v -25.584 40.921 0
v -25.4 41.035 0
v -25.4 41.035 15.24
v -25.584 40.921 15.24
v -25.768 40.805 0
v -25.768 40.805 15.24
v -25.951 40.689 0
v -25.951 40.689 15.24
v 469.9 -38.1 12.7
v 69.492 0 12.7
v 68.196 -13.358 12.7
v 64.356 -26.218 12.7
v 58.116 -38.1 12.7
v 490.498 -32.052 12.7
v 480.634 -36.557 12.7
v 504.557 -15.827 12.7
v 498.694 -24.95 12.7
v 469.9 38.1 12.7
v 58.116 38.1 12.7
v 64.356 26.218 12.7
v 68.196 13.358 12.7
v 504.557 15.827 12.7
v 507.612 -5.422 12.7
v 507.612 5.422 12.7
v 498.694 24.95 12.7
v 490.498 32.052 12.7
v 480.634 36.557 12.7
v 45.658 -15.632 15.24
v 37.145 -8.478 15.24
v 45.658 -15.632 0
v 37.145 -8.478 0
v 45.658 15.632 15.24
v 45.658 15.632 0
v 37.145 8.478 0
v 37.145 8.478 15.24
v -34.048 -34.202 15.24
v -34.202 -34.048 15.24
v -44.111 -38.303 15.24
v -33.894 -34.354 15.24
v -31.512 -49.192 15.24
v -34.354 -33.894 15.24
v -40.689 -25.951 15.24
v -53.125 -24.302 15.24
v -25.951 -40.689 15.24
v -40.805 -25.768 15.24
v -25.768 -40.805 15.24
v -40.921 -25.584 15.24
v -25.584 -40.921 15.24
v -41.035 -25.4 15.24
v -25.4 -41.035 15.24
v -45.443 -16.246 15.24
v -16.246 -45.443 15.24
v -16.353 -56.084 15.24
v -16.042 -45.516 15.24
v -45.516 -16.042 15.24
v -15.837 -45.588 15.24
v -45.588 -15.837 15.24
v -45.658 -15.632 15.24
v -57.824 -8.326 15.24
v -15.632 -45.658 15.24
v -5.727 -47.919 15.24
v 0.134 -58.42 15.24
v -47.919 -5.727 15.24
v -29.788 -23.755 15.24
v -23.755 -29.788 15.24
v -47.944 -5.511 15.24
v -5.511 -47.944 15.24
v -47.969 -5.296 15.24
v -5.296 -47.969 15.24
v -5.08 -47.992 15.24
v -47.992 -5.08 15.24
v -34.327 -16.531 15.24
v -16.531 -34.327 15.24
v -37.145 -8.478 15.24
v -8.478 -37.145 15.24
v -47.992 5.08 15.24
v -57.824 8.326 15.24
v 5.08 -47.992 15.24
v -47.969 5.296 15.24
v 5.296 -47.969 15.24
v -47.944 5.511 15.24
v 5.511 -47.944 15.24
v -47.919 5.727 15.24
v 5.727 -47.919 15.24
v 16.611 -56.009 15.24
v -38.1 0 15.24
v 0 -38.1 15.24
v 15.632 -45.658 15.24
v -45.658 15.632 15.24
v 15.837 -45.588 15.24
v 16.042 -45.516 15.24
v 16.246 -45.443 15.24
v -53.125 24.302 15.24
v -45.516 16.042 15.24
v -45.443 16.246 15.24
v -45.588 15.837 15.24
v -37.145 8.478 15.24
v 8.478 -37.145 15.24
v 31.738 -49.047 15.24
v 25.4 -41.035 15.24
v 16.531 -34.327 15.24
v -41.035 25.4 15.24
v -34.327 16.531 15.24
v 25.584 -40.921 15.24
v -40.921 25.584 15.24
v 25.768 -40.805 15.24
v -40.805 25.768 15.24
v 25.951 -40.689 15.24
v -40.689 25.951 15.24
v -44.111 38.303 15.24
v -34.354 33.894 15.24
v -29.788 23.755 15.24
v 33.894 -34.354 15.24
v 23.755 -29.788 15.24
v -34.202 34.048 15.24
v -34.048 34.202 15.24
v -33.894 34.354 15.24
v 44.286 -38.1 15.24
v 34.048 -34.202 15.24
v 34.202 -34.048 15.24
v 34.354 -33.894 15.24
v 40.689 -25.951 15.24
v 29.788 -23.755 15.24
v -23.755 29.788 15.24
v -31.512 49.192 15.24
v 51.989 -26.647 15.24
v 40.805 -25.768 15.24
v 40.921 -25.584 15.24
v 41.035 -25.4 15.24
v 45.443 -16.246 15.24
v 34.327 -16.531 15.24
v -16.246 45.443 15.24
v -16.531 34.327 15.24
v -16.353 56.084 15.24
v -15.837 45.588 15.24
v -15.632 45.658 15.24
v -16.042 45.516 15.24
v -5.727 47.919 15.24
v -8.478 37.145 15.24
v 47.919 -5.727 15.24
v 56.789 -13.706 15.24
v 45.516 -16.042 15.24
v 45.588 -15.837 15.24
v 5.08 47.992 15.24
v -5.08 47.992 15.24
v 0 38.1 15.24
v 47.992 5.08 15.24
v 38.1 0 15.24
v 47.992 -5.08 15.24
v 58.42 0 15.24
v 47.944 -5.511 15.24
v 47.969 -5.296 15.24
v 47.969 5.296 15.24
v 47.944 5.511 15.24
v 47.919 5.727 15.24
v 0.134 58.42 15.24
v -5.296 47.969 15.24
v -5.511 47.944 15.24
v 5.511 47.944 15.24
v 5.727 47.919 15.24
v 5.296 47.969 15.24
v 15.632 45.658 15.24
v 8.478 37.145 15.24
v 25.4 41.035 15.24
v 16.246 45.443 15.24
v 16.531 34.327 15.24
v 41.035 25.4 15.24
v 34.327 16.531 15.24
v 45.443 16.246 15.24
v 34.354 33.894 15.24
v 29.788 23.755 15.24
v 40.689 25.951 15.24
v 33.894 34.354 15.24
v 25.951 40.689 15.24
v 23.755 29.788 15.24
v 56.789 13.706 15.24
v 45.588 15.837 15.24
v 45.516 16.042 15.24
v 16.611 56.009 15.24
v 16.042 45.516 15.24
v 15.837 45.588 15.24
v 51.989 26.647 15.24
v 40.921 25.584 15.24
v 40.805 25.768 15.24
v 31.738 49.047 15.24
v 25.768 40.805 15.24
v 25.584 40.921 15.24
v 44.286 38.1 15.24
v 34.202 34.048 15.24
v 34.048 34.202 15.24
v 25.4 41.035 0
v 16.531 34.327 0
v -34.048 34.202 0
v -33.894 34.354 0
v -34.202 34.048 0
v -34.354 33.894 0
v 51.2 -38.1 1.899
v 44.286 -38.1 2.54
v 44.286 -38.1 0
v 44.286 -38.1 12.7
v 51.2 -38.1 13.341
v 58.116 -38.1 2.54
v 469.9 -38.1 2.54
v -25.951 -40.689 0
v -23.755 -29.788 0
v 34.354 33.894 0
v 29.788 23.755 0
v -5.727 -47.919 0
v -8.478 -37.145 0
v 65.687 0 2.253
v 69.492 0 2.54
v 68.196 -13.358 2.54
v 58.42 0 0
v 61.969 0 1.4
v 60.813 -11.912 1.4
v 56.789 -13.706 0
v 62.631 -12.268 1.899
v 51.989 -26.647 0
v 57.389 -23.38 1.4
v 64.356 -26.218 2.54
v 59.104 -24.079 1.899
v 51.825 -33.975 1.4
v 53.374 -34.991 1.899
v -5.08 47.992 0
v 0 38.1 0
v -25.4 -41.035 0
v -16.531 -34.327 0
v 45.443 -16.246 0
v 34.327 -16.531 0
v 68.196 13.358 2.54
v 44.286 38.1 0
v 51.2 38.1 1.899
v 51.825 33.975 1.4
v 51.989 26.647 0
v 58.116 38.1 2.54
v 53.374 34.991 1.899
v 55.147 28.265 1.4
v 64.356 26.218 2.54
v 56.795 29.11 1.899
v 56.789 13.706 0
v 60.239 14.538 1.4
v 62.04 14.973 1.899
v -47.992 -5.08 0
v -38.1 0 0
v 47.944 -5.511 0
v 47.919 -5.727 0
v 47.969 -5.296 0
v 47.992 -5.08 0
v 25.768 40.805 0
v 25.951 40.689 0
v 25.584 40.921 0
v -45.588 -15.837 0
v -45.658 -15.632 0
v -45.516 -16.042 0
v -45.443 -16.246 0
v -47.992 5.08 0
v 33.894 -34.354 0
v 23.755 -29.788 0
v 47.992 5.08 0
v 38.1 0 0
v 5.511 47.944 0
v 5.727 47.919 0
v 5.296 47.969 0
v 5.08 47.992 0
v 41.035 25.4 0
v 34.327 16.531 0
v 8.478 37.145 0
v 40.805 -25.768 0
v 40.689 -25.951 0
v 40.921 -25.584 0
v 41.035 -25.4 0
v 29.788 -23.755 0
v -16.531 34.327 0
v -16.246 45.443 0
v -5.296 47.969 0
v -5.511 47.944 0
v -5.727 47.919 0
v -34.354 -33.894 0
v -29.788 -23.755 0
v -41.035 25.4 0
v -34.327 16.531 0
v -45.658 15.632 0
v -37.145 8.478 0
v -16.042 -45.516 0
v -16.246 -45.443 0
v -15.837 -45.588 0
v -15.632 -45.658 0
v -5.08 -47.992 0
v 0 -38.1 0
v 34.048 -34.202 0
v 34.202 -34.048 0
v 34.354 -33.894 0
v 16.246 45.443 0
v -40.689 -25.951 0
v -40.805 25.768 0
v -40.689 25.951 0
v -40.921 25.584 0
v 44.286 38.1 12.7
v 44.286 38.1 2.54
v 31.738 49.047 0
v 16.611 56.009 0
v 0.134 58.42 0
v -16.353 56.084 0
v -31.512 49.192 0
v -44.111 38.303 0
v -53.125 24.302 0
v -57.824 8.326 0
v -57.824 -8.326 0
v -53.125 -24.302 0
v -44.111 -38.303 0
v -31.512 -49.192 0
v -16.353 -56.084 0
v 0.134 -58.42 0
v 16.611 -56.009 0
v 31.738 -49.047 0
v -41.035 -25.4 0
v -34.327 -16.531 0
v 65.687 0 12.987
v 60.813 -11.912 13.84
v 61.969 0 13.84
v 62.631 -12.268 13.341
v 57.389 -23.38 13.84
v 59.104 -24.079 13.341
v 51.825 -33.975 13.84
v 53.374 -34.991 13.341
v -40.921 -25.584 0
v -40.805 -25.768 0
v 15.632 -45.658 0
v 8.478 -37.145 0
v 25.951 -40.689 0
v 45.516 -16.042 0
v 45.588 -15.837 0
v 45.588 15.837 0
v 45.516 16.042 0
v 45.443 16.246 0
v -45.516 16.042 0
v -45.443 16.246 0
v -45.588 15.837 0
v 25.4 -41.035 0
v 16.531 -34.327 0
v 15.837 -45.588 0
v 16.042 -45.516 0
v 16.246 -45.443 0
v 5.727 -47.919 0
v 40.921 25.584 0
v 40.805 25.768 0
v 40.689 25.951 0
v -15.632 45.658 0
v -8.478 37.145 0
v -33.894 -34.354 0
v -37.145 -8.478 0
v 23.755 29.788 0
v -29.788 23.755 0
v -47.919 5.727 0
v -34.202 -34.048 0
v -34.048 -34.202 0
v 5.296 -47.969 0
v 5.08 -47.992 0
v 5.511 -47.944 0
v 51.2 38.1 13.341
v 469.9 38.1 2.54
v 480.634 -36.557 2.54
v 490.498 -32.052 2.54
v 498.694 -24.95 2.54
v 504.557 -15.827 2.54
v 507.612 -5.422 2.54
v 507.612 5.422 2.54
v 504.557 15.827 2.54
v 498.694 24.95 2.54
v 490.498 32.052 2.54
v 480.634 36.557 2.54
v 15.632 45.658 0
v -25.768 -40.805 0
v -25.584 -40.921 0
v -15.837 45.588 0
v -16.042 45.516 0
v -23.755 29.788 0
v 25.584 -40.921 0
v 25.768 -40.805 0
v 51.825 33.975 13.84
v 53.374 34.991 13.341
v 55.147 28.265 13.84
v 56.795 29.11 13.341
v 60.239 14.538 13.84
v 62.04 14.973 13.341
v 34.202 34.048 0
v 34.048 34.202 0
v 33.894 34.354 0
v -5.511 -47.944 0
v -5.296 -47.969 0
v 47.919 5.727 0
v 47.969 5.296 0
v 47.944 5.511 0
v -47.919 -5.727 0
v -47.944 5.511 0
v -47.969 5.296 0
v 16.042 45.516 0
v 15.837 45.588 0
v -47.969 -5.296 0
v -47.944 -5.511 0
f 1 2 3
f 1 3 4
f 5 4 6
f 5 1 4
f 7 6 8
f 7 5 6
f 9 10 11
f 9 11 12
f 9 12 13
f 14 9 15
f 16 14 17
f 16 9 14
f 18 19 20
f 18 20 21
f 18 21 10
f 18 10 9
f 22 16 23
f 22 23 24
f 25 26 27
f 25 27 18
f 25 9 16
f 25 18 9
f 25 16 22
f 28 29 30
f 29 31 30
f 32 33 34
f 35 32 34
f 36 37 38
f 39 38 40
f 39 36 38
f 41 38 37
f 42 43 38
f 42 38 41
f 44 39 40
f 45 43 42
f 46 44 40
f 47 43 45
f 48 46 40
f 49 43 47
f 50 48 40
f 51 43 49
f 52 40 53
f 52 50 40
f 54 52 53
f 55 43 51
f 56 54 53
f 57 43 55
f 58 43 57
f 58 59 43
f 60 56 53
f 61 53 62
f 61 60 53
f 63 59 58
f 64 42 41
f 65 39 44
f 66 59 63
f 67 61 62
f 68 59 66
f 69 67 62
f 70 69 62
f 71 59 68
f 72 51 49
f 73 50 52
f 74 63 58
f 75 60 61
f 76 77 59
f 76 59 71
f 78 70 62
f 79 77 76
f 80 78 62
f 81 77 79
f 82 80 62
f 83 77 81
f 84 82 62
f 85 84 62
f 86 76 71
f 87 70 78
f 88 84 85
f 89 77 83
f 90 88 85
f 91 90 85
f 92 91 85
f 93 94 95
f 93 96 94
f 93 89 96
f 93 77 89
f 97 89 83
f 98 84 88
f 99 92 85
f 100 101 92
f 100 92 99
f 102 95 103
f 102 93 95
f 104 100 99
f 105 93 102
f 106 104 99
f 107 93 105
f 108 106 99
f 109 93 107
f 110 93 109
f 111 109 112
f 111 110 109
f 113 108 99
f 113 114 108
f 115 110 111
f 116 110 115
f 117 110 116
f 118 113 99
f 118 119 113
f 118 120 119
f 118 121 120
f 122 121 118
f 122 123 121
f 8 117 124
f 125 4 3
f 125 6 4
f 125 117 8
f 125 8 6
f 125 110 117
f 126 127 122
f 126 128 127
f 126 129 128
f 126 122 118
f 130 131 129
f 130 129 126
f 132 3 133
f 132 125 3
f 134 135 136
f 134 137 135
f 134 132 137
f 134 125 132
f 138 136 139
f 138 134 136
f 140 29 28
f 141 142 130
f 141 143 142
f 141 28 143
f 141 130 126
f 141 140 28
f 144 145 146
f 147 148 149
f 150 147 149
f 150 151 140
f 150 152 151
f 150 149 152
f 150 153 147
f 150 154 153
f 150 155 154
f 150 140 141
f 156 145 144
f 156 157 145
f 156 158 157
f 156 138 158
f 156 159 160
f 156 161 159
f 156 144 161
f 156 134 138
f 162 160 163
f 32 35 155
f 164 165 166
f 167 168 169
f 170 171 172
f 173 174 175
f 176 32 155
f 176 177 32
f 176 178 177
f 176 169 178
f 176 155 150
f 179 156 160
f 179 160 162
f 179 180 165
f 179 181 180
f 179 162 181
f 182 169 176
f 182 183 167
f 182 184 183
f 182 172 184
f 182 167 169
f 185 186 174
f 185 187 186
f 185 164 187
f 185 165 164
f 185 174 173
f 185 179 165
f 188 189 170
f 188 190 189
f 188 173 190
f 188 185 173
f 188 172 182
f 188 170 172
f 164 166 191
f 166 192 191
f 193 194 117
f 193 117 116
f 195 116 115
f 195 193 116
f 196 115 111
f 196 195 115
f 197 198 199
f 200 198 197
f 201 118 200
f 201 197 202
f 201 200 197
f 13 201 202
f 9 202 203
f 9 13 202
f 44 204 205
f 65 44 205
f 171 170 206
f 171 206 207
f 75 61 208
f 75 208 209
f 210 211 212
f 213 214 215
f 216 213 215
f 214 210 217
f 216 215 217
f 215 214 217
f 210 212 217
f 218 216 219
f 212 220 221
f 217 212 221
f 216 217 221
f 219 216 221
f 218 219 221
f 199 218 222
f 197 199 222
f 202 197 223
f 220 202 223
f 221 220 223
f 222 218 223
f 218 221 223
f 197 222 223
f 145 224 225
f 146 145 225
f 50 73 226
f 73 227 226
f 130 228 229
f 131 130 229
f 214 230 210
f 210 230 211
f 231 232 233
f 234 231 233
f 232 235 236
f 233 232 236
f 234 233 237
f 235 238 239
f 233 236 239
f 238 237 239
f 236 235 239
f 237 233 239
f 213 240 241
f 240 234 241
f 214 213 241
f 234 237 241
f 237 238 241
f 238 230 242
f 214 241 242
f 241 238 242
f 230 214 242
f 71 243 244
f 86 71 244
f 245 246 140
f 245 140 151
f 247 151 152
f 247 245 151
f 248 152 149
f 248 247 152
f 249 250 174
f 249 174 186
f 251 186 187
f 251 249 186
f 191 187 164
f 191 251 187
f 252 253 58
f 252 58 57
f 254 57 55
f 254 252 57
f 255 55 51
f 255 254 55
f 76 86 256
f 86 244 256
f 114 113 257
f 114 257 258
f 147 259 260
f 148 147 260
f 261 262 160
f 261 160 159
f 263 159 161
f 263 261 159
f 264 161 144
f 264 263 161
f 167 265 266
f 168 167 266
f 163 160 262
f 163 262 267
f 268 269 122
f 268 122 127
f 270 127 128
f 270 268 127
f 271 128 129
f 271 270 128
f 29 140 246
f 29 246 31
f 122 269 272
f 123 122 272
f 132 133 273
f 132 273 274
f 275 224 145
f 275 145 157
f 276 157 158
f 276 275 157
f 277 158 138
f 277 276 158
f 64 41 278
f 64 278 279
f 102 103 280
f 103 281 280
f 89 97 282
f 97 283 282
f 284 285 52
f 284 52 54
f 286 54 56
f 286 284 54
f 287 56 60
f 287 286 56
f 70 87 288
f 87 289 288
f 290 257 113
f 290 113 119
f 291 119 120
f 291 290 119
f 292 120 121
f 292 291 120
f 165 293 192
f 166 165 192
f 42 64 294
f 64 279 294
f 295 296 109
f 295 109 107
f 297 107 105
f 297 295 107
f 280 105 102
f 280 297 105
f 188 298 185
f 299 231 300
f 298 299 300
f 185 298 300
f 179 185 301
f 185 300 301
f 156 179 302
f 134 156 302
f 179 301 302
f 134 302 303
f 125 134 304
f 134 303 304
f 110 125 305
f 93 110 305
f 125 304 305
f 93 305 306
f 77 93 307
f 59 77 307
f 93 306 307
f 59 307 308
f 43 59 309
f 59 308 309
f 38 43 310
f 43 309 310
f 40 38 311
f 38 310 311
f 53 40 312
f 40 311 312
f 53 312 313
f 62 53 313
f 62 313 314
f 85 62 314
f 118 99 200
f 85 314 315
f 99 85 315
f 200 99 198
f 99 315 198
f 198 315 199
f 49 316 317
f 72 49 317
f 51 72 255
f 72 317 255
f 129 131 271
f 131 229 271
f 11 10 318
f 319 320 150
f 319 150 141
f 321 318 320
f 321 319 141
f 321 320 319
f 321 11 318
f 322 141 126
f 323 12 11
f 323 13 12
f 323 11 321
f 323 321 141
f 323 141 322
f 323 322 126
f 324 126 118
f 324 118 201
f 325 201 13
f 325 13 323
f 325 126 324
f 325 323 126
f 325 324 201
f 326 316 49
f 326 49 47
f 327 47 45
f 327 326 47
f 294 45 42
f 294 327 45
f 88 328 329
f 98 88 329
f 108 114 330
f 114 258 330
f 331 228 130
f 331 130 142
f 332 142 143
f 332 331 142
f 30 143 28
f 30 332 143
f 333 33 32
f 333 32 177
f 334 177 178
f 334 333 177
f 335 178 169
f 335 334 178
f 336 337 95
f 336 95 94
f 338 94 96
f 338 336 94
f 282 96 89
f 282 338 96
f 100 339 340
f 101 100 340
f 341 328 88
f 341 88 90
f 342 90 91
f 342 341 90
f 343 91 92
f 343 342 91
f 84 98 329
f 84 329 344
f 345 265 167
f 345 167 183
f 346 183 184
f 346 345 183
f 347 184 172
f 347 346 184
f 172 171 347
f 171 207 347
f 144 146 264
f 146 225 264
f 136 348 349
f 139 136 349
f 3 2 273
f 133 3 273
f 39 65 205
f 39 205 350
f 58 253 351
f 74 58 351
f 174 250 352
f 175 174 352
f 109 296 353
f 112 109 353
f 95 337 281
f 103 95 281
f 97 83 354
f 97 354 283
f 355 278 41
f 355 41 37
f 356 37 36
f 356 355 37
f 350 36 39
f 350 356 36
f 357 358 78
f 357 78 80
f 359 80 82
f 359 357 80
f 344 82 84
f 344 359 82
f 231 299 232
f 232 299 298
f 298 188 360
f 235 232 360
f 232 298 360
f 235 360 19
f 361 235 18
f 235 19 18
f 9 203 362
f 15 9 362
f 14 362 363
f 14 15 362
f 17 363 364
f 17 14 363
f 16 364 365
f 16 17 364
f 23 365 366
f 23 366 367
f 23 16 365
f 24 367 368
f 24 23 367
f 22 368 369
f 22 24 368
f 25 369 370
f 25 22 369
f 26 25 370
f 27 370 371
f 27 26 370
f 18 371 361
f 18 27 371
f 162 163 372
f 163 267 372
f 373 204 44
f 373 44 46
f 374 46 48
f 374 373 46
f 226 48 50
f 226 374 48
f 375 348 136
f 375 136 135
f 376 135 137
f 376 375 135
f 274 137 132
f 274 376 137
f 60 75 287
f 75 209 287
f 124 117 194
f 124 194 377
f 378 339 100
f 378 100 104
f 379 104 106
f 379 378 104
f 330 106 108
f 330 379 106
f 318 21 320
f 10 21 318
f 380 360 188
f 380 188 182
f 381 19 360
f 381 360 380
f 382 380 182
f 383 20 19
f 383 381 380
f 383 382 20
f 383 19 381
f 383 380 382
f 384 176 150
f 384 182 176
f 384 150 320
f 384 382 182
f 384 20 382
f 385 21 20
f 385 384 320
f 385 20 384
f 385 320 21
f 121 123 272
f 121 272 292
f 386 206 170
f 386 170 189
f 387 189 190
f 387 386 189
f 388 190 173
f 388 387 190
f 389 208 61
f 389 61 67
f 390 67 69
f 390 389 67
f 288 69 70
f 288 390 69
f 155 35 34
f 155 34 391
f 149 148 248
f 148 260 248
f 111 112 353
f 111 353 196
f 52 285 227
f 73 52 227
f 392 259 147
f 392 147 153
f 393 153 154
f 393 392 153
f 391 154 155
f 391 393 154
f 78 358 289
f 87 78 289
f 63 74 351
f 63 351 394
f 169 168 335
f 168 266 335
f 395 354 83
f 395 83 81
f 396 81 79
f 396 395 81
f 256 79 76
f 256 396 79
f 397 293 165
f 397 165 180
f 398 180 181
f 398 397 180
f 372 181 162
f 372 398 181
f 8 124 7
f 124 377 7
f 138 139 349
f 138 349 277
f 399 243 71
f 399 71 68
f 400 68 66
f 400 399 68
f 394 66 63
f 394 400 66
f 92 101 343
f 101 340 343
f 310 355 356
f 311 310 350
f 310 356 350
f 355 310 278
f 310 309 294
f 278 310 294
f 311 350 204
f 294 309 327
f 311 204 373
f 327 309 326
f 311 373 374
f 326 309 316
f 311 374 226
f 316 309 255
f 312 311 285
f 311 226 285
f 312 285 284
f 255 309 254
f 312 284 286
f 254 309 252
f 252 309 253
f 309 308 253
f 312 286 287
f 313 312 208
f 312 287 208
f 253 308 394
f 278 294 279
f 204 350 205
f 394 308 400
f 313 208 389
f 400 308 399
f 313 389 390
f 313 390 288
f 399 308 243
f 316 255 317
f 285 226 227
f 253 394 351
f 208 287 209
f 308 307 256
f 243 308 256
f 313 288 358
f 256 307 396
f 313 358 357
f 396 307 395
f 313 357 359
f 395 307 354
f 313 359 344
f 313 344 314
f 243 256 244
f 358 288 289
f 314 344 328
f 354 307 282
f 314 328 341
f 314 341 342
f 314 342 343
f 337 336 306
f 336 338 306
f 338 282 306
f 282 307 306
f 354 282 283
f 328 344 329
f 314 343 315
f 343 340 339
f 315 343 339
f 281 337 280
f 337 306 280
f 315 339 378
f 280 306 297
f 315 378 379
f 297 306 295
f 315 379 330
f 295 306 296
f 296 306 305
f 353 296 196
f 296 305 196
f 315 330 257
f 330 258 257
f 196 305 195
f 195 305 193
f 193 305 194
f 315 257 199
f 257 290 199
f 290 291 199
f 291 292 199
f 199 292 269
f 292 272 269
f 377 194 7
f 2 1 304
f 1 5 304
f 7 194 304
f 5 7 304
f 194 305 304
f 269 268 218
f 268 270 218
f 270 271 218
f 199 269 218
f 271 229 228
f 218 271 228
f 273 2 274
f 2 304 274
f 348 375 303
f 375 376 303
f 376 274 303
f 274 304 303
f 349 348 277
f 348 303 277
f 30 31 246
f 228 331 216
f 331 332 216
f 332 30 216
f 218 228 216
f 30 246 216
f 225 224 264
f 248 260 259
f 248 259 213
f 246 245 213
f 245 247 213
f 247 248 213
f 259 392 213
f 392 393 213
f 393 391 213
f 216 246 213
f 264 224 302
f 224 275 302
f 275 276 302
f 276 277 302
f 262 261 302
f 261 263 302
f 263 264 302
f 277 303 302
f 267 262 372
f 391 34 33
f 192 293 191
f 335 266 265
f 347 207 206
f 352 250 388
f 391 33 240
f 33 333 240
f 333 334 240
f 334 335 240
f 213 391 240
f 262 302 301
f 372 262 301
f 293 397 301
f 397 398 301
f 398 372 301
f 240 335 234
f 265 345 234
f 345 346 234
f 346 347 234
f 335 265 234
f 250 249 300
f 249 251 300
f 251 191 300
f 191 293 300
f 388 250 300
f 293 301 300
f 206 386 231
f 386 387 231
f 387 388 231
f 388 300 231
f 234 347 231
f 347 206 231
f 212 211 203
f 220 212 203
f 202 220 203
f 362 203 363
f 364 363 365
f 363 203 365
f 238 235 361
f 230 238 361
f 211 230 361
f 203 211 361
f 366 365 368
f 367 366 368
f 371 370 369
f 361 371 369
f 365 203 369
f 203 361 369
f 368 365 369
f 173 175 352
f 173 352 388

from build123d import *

# Parameters (mm, degrees)
F0_R         = 58.42
F0_R_2       = 48.26
F1_DEPTH     = 15.24
F4_DEPTH     = 5.08
F6_DEPTH     = 7.62
F7_T4_ANGLE  = 67.8542971522
F7_T9_ANGLE  = 67.8542971522
F7_T14_ANGLE = 67.8542971522
F7_T19_ANGLE = 67.8542971522


# Not quite as in the source:
# - a fillet or chamfer that OpenCascade refuses, or shapes differently, is made with other operations: its cross-section is extruded or revolved along the edge and cut away or added


with BuildPart() as f1:
    # F0 (on Top) → F1 (new body)
    with BuildSketch(Plane.XY):
        Circle(F0_R)
        Circle(F0_R_2, mode=Mode.SUBTRACT)
    extrude(amount=F1_DEPTH)

    # F3 (on offset) → F4 (join, symmetric)
    with BuildSketch(Plane.XY.offset(7.62)):
        with BuildLine():
            Line((469.9, 38.1), (44.2864132664, 38.1))
            ThreePointArc((44.2864132664, 38.1), (58.3891573479, 0), (44.2864132664, -38.1))
            Line((44.2864132664, -38.1), (469.9, -38.1))
            ThreePointArc((469.9, -38.1), (508, 0), (469.9, 38.1))
        make_face()
    extrude(amount=F4_DEPTH, both=True)

    # F5 (on offset) → F6 (join, symmetric)
    with BuildSketch(Plane.XY.offset(7.62)):
        with BuildLine():
            Line((-15.6318332701, 45.6582236691), (-8.4780475837, 37.1447534541))
            Line((-8.4780475837, 37.1447534541), (-5.7265656824, 47.9190363581))
            ThreePointArc((-5.7265656824, 47.9190363581), (-10.7388602727, 47.0500210419), (-15.6318332701, 45.6582236691))
        make_face()
        with BuildLine():
            Line((-5.08, 47.9918868143), (0, 38.1))
            Line((0, 38.1), (5.08, 47.9918868143))
            ThreePointArc((5.08, 47.9918868143), (0, 48.26), (-5.08, 47.9918868143))
        make_face()
        with BuildLine():
            Line((5.7265656824, 47.9190363581), (8.4780475837, 37.1447534541))
            Line((8.4780475837, 37.1447534541), (15.6318332701, 45.6582236691))
            ThreePointArc((15.6318332701, 45.6582236691), (10.7388602727, 47.0500210419), (5.7265656824, 47.9190363581))
        make_face()
        with BuildLine():
            Line((16.2459774494, 45.4433253263), (16.5309704604, 34.3269138671))
            Line((16.5309704604, 34.3269138671), (25.3998211473, 41.0350665369))
            ThreePointArc((25.3998211473, 41.0350665369), (20.9392292498, 43.480757565), (16.2459774494, 45.4433253263))
        make_face()
        with BuildLine():
            Line((25.9507480698, 40.6888962079), (23.7549614508, 29.787779482))
            Line((23.7549614508, 29.787779482), (33.8941559316, 34.354239821))
            ThreePointArc((33.8941559316, 34.354239821), (30.0896178377, 37.7311873439), (25.9507480698, 40.6888962079))
        make_face()
        with BuildLine():
            Line((34.354239821, 33.8941559316), (29.787779482, 23.7549614508))
            Line((29.787779482, 23.7549614508), (40.6888962079, 25.9507480698))
            ThreePointArc((40.6888962079, 25.9507480698), (37.7311873439, 30.0896178377), (34.354239821, 33.8941559316))
        make_face()
        with BuildLine():
            Line((41.0350665369, 25.3998211473), (34.3269138671, 16.5309704604))
            Line((34.3269138671, 16.5309704604), (45.4433253263, 16.2459774494))
            ThreePointArc((45.4433253263, 16.2459774494), (43.480757565, 20.9392292498), (41.0350665369, 25.3998211473))
        make_face()
        with BuildLine():
            Line((45.6582236691, 15.6318332701), (37.1447534541, 8.4780475837))
            Line((37.1447534541, 8.4780475837), (47.9190363581, 5.7265656824))
            ThreePointArc((47.9190363581, 5.7265656824), (47.0500210419, 10.7388602727), (45.6582236691, 15.6318332701))
        make_face()
        with BuildLine():
            Line((47.9918868143, 5.08), (38.1, 0))
            Line((38.1, 0), (47.9918868143, -5.08))
            ThreePointArc((47.9918868143, -5.08), (48.26, 0), (47.9918868143, 5.08))
        make_face()
        with BuildLine():
            Line((47.9190363581, -5.7265656824), (37.1447534541, -8.4780475837))
            Line((37.1447534541, -8.4780475837), (45.6582236691, -15.6318332701))
            ThreePointArc((45.6582236691, -15.6318332701), (47.0500210419, -10.7388602727), (47.9190363581, -5.7265656824))
        make_face()
        with BuildLine():
            Line((45.4433253263, -16.2459774494), (34.3269138671, -16.5309704604))
            Line((34.3269138671, -16.5309704604), (41.0350665369, -25.3998211473))
            ThreePointArc((41.0350665369, -25.3998211473), (43.480757565, -20.9392292498), (45.4433253263, -16.2459774494))
        make_face()
        with BuildLine():
            Line((40.6888962079, -25.9507480698), (29.787779482, -23.7549614508))
            Line((29.787779482, -23.7549614508), (34.354239821, -33.8941559316))
            ThreePointArc((34.354239821, -33.8941559316), (37.7311873439, -30.0896178377), (40.6888962079, -25.9507480698))
        make_face()
        with BuildLine():
            Line((25.3998211473, -41.0350665369), (16.5309704604, -34.3269138671))
            Line((16.5309704604, -34.3269138671), (16.2459774494, -45.4433253263))
            ThreePointArc((16.2459774494, -45.4433253263), (20.9392292498, -43.480757565), (25.3998211473, -41.0350665369))
        make_face()
        with BuildLine():
            Line((15.6318332701, -45.6582236691), (8.4780475837, -37.1447534541))
            Line((8.4780475837, -37.1447534541), (5.7265656824, -47.9190363581))
            ThreePointArc((5.7265656824, -47.9190363581), (10.7388602727, -47.0500210419), (15.6318332701, -45.6582236691))
        make_face()
        with BuildLine():
            Line((5.08, -47.9918868143), (0, -38.1))
            Line((0, -38.1), (-5.08, -47.9918868143))
            ThreePointArc((-5.08, -47.9918868143), (0, -48.26), (5.08, -47.9918868143))
        make_face()
        with BuildLine():
            Line((33.8941559316, -34.354239821), (23.7549614508, -29.787779482))
            Line((23.7549614508, -29.787779482), (25.9507480698, -40.6888962079))
            ThreePointArc((25.9507480698, -40.6888962079), (30.0896178377, -37.7311873439), (33.8941559316, -34.354239821))
        make_face()
        with BuildLine():
            Line((-5.7265656824, -47.9190363581), (-8.4780475837, -37.1447534541))
            Line((-8.4780475837, -37.1447534541), (-15.6318332701, -45.6582236691))
            ThreePointArc((-15.6318332701, -45.6582236691), (-10.7388602727, -47.0500210419), (-5.7265656824, -47.9190363581))
        make_face()
        with BuildLine():
            Line((-16.2459774494, -45.4433253263), (-16.5309704604, -34.3269138671))
            Line((-16.5309704604, -34.3269138671), (-25.3998211473, -41.0350665369))
            ThreePointArc((-25.3998211473, -41.0350665369), (-20.9392292498, -43.480757565), (-16.2459774494, -45.4433253263))
        make_face()
        with BuildLine():
            Line((-25.9507480698, -40.6888962079), (-23.7549614508, -29.787779482))
            Line((-23.7549614508, -29.787779482), (-33.8941559316, -34.354239821))
            ThreePointArc((-33.8941559316, -34.354239821), (-30.0896178377, -37.7311873439), (-25.9507480698, -40.6888962079))
        make_face()
        with BuildLine():
            Line((-34.354239821, -33.8941559316), (-29.787779482, -23.7549614508))
            Line((-29.787779482, -23.7549614508), (-40.6888962079, -25.9507480698))
            ThreePointArc((-40.6888962079, -25.9507480698), (-37.7311873439, -30.0896178377), (-34.354239821, -33.8941559316))
        make_face()
        with BuildLine():
            Line((-41.0350665369, -25.3998211473), (-34.3269138671, -16.5309704604))
            Line((-34.3269138671, -16.5309704604), (-45.4433253263, -16.2459774494))
            ThreePointArc((-45.4433253263, -16.2459774494), (-43.480757565, -20.9392292498), (-41.0350665369, -25.3998211473))
        make_face()
        with BuildLine():
            Line((-45.6582236691, -15.6318332701), (-37.1447534541, -8.4780475837))
            Line((-37.1447534541, -8.4780475837), (-47.9190363581, -5.7265656824))
            ThreePointArc((-47.9190363581, -5.7265656824), (-47.0500210419, -10.7388602727), (-45.6582236691, -15.6318332701))
        make_face()
        with BuildLine():
            Line((-47.9918868143, -5.08), (-38.1, 0))
            Line((-38.1, 0), (-47.9918868143, 5.08))
            ThreePointArc((-47.9918868143, 5.08), (-48.26, 0), (-47.9918868143, -5.08))
        make_face()
        with BuildLine():
            Line((-47.9190363581, 5.7265656824), (-37.1447534541, 8.4780475837))
            Line((-37.1447534541, 8.4780475837), (-45.6582236691, 15.6318332701))
            ThreePointArc((-45.6582236691, 15.6318332701), (-47.0500210419, 10.7388602727), (-47.9190363581, 5.7265656824))
        make_face()
        with BuildLine():
            Line((-45.4433253263, 16.2459774494), (-34.3269138671, 16.5309704604))
            Line((-34.3269138671, 16.5309704604), (-41.0350665369, 25.3998211473))
            ThreePointArc((-41.0350665369, 25.3998211473), (-43.480757565, 20.9392292498), (-45.4433253263, 16.2459774494))
        make_face()
        with BuildLine():
            Line((-40.6888962079, 25.9507480698), (-29.787779482, 23.7549614508))
            Line((-29.787779482, 23.7549614508), (-34.354239821, 33.8941559316))
            ThreePointArc((-34.354239821, 33.8941559316), (-37.7311873439, 30.0896178377), (-40.6888962079, 25.9507480698))
        make_face()
        with BuildLine():
            Line((-33.8941559316, 34.354239821), (-23.7549614508, 29.787779482))
            Line((-23.7549614508, 29.787779482), (-25.9507480698, 40.6888962079))
            ThreePointArc((-25.9507480698, 40.6888962079), (-30.0896178377, 37.7311873439), (-33.8941559316, 34.354239821))
        make_face()
        with BuildLine():
            Line((-25.3998211473, 41.0350665369), (-16.5309704604, 34.3269138671))
            Line((-16.5309704604, 34.3269138671), (-16.2459774494, 45.4433253263))
            ThreePointArc((-16.2459774494, 45.4433253263), (-20.9392292498, 43.480757565), (-25.3998211473, 41.0350665369))
        make_face()
    extrude(amount=F6_DEPTH, both=True)

    # F7: fillet of radius 25.4 on 4 edges, made by hand


with BuildPart() as f7_tool2:
    # F7_s3 → F7_t4 (revolve)
    with BuildSketch(Plane.XZ):
        with BuildLine():
            ThreePointArc((58.42, 15.24), (63.8119906537, 13.3431423642), (69.4916033166, 12.7))
            Line((69.4916033166, 12.7), (58.42, 12.7))
            Line((58.42, 12.7), (58.42, 15.24))
        make_face()
    revolve(axis=Axis((0, 0, 12.7), (0, 0, -1)), revolution_arc=F7_T4_ANGLE)

    split(bisect_by=Plane.XZ.offset(38.1), keep=Keep.BOTTOM)


with BuildPart() as f1_1:
    add(f1.part)

    # F7_t1: union F7_tool2
    add(f7_tool2.part)


with BuildPart() as f7_tool7:
    # F7_s8 → F7_t9 (revolve)
    with BuildSketch(Plane(origin=(0, 0, 0), x_dir=(0, 0, 1), z_dir=(-0.9262282352, 0.376963203, 0))):
        with BuildLine():
            ThreePointArc((15.24, 58.42), (13.3431423642, 63.8119906537), (12.7, 69.4916033166))
            Line((12.7, 69.4916033166), (12.7, 58.42))
            Line((12.7, 58.42), (15.24, 58.42))
        make_face()
    revolve(axis=Axis((0, 0, 12.7), (0, 0, -1)), revolution_arc=F7_T9_ANGLE)

    split(bisect_by=Plane.XZ.offset(-38.1), keep=Keep.TOP)


with BuildPart() as f1_2:
    add(f1_1.part)

    # F7_t6: union F7_tool7
    add(f7_tool7.part)


with BuildPart() as f7_tool12:
    # F7_s13 → F7_t14 (revolve)
    with BuildSketch(Plane.XZ):
        with BuildLine():
            ThreePointArc((58.42, 0), (63.8119906537, 1.8968576358), (69.4916033166, 2.54))
            Line((69.4916033166, 2.54), (58.42, 2.54))
            Line((58.42, 2.54), (58.42, 0))
        make_face()
    revolve(axis=Axis((0, 0, 2.54), (0, 0, -1)), revolution_arc=F7_T14_ANGLE)

    split(bisect_by=Plane.XZ.offset(38.1), keep=Keep.BOTTOM)


with BuildPart() as f1_3:
    add(f1_2.part)

    # F7_t11: union F7_tool12
    add(f7_tool12.part)


with BuildPart() as f7_tool17:
    # F7_s18 → F7_t19 (revolve)
    with BuildSketch(Plane(origin=(0, 0, 0), x_dir=(0, 0, 1), z_dir=(-0.9262282352, 0.376963203, 0))):
        with BuildLine():
            ThreePointArc((0, 58.42), (1.8968576358, 63.8119906537), (2.54, 69.4916033166))
            Line((2.54, 69.4916033166), (2.54, 58.42))
            Line((2.54, 58.42), (0, 58.42))
        make_face()
    revolve(axis=Axis((0, 0, 2.54), (0, 0, -1)), revolution_arc=F7_T19_ANGLE)

    split(bisect_by=Plane.XZ.offset(-38.1), keep=Keep.TOP)


with BuildPart() as f1_4:
    add(f1_3.part)

    # F7_t16: union F7_tool17
    add(f7_tool17.part)


solid = f1_4.part
